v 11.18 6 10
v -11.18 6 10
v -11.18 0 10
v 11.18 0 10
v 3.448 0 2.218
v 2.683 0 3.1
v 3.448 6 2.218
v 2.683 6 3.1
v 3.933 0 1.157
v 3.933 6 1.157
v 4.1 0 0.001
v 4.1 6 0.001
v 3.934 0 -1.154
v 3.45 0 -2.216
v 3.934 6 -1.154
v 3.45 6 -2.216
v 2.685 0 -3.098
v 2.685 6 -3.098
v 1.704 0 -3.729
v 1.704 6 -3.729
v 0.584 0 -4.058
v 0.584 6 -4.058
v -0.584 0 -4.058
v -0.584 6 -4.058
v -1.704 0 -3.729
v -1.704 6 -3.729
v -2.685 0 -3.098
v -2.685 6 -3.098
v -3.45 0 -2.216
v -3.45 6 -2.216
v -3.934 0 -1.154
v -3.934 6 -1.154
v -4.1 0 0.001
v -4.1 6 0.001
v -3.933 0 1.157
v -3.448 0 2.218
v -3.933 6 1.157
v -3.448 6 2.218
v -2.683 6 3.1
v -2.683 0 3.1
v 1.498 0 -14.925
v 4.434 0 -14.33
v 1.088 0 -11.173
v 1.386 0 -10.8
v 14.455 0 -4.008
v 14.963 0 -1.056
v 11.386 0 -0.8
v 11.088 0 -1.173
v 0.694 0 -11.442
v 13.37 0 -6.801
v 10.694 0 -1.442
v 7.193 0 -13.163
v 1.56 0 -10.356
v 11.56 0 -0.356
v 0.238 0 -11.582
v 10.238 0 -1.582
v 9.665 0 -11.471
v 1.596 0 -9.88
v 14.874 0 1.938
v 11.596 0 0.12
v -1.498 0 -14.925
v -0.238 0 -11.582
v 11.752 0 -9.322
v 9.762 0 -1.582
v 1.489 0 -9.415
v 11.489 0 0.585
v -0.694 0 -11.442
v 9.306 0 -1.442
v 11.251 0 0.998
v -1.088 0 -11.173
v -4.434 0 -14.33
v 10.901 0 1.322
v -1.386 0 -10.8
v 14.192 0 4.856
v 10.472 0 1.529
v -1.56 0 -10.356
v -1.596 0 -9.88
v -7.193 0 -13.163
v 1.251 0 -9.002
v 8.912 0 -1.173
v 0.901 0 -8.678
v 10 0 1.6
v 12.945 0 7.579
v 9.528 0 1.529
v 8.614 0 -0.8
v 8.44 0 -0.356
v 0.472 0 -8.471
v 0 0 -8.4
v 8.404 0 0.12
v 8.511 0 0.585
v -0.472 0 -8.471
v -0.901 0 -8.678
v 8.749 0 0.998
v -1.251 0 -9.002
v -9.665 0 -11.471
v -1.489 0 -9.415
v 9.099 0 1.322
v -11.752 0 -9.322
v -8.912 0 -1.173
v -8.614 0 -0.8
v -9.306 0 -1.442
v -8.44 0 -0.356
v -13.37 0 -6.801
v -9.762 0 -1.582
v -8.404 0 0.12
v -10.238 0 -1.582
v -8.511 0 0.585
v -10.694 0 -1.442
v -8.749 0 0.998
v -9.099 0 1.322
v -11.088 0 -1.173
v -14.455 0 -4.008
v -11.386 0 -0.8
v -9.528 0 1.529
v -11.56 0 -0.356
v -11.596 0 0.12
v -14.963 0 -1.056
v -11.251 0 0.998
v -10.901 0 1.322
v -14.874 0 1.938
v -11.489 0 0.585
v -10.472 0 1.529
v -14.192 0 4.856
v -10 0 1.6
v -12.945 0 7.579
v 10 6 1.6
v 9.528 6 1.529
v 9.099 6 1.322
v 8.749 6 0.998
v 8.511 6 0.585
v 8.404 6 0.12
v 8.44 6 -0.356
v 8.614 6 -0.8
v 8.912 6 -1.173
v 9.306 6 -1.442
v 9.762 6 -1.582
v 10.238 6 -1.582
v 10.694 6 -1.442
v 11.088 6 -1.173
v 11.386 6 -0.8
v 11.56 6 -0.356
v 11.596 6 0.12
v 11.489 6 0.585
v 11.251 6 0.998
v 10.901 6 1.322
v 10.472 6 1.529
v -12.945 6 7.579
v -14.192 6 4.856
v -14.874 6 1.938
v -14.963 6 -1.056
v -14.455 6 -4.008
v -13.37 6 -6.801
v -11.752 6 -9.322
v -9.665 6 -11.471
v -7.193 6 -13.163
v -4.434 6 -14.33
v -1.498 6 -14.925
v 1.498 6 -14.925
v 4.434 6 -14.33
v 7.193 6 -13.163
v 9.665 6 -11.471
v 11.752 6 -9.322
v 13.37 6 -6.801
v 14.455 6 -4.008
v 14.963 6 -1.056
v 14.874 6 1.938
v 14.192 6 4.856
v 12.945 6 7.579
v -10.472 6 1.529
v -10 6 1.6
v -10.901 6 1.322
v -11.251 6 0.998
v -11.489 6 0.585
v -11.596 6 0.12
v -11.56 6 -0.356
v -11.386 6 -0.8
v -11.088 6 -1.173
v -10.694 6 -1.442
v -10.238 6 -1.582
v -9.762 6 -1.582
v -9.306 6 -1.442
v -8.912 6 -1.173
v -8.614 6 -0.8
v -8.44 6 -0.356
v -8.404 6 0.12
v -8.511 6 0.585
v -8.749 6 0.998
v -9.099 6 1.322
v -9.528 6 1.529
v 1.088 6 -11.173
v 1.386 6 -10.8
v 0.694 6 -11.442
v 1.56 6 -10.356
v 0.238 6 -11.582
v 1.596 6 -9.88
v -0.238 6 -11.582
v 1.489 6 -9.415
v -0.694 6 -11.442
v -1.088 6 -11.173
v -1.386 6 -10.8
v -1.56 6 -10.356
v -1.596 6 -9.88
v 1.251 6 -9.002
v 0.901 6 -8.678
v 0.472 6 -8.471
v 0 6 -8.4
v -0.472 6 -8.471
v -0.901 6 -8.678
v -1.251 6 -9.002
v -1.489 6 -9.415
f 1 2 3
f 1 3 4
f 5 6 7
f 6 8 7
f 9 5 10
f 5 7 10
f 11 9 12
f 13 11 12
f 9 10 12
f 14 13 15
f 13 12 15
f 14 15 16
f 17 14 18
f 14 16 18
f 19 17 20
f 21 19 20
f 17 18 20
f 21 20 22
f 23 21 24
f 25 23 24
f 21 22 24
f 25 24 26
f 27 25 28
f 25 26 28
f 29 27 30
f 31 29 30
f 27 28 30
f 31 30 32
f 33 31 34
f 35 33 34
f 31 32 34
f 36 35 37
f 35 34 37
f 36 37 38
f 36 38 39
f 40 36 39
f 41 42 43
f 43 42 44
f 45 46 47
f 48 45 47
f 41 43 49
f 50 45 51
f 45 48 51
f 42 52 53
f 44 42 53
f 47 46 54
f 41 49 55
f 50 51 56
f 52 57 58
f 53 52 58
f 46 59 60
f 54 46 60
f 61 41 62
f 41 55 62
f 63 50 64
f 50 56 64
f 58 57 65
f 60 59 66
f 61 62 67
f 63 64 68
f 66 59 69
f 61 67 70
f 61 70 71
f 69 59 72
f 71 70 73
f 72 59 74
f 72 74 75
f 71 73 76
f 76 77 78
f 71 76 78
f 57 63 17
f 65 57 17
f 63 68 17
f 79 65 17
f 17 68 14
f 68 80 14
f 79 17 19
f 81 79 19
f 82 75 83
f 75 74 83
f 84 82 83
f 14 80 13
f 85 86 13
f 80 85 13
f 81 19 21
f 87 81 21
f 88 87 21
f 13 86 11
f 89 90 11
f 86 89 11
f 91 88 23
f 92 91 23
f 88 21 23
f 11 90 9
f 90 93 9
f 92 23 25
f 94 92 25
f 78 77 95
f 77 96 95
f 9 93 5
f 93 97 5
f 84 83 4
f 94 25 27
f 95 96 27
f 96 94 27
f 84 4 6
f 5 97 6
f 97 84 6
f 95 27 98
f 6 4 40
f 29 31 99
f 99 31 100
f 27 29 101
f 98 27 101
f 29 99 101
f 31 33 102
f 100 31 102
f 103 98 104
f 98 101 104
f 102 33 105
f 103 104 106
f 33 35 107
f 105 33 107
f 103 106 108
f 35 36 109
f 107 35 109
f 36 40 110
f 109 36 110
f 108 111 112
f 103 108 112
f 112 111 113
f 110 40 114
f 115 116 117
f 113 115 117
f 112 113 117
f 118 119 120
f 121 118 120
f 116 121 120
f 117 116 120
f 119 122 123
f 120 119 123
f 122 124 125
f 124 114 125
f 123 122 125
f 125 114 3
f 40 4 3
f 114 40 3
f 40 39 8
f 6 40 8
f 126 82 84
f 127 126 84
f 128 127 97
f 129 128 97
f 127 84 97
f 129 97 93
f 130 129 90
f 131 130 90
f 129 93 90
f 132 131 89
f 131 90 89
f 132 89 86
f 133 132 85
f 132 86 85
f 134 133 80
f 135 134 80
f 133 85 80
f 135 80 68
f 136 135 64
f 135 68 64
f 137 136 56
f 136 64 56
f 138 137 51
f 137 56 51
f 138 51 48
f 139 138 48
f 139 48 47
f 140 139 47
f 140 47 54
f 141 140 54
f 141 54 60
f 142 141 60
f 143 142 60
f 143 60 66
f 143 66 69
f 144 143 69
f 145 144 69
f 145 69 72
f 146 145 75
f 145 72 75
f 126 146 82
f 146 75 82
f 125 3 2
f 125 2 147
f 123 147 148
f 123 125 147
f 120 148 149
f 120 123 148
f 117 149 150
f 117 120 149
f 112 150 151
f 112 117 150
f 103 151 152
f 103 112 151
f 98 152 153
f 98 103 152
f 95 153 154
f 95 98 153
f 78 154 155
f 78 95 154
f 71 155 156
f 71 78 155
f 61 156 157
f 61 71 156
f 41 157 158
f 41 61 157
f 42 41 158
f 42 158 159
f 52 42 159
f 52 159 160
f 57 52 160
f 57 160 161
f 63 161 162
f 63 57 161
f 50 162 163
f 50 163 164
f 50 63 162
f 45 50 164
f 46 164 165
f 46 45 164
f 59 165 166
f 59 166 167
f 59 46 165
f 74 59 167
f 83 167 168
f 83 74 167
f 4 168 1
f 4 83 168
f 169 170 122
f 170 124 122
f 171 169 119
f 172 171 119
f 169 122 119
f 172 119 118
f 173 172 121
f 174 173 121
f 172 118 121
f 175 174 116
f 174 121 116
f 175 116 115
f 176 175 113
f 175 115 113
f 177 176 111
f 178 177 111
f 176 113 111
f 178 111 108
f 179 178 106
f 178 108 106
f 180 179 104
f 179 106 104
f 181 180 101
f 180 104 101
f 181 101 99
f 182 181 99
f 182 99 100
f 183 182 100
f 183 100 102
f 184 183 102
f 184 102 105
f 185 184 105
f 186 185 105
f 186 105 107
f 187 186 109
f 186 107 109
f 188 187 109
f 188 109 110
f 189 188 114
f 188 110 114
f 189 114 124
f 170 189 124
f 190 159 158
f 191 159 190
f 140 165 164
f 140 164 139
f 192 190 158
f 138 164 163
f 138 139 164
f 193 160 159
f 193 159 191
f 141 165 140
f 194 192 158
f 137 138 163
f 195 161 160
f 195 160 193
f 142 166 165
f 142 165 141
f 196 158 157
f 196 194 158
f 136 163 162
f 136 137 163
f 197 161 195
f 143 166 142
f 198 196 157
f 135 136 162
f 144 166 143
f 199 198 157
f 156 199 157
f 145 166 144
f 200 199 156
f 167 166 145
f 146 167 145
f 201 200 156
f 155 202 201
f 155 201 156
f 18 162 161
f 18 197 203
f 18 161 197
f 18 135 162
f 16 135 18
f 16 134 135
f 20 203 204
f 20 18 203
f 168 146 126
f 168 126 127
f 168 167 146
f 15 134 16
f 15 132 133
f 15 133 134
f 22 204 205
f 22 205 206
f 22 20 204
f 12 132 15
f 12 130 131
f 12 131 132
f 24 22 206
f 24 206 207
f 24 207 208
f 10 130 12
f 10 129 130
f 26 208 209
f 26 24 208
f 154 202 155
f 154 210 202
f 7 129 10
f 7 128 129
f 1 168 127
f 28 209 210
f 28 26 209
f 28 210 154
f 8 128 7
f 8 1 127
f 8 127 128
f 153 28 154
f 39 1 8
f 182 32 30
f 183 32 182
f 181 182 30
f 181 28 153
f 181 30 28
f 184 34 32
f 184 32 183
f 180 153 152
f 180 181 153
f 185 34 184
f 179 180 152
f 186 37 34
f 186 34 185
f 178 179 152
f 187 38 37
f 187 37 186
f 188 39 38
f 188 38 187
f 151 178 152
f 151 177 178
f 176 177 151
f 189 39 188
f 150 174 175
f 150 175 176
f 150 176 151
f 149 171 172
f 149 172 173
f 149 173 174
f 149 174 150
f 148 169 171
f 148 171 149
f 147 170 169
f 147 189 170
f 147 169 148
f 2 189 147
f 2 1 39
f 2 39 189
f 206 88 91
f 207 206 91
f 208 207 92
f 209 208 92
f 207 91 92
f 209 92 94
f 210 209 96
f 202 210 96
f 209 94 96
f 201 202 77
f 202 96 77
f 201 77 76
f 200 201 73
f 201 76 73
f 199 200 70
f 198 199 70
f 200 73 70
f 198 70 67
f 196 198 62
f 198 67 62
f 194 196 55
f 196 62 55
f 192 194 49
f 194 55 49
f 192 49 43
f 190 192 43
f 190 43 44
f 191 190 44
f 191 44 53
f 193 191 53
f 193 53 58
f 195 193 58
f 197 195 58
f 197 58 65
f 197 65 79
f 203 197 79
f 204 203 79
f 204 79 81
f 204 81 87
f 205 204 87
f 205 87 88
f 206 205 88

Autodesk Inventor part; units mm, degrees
ref_plane "YZ Plane" through (0, 0, 0) normal (1, 0, 0) x (0, 1, 0)
ref_plane "XZ Plane" through (0, 0, 0) normal (0, 1, 0) x (-1, 0, 0)
ref_plane "XY Plane" through (0, 0, 0) normal (0, 0, 1) x (1, 0, 0)
sketch "スケッチ1" plane through (0, 0, 0) normal (0, 1, 0) x (-1, 0, 0)
  circle A0 centre (0, 0) radius 15
  dimension "d0" = 30
extrude "押し出し1" add sketch "スケッチ1" along normal blind 6
sketch "スケッチ2" plane through (0, 6, 0) normal (0, 1, 0) x (1, 0, 0)
  arc A0 (2.6833, -3.1) -> (-2.6833, -3.1) centre (0, 0) ccw
  line L0 (-2.6833, -3.1) -> (2.6833, -3.1)
  point P0 (0, -3.1)
  dimension "d3" = 8.2
  dimension "d4" = 3.1
extrude "押し出し2" cut sketch "スケッチ2" against normal blind 6
sketch "スケッチ3" plane through (0, 6, 0) normal (0, 1, 0) x (1, 0, 0)
  circle A0 centre (0, 0) radius 15 projected
  circle A1 centre (0, 0) radius 15 projected
  line L0 (-11.1803, -10) -> (11.1803, -10)
  arc A2 (-11.1803, -10) -> (11.1803, -10) centre (0, 0) ccw
  point P0 (0, -10)
  dimension "d7" = 10
extrude "押し出し3" cut sketch "スケッチ3" against normal blind 6 contours L0 A0 picked at (2.8264, -10.7912)
sketch "スケッチ4" plane through (0, 6, 0) normal (0, 1, 0) x (1, 0, 0)
  circle A0 centre (0, 0) radius 10 construction
  point P0 (-10, 0)
  point P1 (0, 10)
  point P2 (10, 0)
  dimension "d10" = 20
hole "穴1" at (-10, 6, 0) at (0, 6, -10) at (10, 6, 0) direction (0, -1, 0) diameter 3.2 end through all
properties part number "射出_留め具1"
